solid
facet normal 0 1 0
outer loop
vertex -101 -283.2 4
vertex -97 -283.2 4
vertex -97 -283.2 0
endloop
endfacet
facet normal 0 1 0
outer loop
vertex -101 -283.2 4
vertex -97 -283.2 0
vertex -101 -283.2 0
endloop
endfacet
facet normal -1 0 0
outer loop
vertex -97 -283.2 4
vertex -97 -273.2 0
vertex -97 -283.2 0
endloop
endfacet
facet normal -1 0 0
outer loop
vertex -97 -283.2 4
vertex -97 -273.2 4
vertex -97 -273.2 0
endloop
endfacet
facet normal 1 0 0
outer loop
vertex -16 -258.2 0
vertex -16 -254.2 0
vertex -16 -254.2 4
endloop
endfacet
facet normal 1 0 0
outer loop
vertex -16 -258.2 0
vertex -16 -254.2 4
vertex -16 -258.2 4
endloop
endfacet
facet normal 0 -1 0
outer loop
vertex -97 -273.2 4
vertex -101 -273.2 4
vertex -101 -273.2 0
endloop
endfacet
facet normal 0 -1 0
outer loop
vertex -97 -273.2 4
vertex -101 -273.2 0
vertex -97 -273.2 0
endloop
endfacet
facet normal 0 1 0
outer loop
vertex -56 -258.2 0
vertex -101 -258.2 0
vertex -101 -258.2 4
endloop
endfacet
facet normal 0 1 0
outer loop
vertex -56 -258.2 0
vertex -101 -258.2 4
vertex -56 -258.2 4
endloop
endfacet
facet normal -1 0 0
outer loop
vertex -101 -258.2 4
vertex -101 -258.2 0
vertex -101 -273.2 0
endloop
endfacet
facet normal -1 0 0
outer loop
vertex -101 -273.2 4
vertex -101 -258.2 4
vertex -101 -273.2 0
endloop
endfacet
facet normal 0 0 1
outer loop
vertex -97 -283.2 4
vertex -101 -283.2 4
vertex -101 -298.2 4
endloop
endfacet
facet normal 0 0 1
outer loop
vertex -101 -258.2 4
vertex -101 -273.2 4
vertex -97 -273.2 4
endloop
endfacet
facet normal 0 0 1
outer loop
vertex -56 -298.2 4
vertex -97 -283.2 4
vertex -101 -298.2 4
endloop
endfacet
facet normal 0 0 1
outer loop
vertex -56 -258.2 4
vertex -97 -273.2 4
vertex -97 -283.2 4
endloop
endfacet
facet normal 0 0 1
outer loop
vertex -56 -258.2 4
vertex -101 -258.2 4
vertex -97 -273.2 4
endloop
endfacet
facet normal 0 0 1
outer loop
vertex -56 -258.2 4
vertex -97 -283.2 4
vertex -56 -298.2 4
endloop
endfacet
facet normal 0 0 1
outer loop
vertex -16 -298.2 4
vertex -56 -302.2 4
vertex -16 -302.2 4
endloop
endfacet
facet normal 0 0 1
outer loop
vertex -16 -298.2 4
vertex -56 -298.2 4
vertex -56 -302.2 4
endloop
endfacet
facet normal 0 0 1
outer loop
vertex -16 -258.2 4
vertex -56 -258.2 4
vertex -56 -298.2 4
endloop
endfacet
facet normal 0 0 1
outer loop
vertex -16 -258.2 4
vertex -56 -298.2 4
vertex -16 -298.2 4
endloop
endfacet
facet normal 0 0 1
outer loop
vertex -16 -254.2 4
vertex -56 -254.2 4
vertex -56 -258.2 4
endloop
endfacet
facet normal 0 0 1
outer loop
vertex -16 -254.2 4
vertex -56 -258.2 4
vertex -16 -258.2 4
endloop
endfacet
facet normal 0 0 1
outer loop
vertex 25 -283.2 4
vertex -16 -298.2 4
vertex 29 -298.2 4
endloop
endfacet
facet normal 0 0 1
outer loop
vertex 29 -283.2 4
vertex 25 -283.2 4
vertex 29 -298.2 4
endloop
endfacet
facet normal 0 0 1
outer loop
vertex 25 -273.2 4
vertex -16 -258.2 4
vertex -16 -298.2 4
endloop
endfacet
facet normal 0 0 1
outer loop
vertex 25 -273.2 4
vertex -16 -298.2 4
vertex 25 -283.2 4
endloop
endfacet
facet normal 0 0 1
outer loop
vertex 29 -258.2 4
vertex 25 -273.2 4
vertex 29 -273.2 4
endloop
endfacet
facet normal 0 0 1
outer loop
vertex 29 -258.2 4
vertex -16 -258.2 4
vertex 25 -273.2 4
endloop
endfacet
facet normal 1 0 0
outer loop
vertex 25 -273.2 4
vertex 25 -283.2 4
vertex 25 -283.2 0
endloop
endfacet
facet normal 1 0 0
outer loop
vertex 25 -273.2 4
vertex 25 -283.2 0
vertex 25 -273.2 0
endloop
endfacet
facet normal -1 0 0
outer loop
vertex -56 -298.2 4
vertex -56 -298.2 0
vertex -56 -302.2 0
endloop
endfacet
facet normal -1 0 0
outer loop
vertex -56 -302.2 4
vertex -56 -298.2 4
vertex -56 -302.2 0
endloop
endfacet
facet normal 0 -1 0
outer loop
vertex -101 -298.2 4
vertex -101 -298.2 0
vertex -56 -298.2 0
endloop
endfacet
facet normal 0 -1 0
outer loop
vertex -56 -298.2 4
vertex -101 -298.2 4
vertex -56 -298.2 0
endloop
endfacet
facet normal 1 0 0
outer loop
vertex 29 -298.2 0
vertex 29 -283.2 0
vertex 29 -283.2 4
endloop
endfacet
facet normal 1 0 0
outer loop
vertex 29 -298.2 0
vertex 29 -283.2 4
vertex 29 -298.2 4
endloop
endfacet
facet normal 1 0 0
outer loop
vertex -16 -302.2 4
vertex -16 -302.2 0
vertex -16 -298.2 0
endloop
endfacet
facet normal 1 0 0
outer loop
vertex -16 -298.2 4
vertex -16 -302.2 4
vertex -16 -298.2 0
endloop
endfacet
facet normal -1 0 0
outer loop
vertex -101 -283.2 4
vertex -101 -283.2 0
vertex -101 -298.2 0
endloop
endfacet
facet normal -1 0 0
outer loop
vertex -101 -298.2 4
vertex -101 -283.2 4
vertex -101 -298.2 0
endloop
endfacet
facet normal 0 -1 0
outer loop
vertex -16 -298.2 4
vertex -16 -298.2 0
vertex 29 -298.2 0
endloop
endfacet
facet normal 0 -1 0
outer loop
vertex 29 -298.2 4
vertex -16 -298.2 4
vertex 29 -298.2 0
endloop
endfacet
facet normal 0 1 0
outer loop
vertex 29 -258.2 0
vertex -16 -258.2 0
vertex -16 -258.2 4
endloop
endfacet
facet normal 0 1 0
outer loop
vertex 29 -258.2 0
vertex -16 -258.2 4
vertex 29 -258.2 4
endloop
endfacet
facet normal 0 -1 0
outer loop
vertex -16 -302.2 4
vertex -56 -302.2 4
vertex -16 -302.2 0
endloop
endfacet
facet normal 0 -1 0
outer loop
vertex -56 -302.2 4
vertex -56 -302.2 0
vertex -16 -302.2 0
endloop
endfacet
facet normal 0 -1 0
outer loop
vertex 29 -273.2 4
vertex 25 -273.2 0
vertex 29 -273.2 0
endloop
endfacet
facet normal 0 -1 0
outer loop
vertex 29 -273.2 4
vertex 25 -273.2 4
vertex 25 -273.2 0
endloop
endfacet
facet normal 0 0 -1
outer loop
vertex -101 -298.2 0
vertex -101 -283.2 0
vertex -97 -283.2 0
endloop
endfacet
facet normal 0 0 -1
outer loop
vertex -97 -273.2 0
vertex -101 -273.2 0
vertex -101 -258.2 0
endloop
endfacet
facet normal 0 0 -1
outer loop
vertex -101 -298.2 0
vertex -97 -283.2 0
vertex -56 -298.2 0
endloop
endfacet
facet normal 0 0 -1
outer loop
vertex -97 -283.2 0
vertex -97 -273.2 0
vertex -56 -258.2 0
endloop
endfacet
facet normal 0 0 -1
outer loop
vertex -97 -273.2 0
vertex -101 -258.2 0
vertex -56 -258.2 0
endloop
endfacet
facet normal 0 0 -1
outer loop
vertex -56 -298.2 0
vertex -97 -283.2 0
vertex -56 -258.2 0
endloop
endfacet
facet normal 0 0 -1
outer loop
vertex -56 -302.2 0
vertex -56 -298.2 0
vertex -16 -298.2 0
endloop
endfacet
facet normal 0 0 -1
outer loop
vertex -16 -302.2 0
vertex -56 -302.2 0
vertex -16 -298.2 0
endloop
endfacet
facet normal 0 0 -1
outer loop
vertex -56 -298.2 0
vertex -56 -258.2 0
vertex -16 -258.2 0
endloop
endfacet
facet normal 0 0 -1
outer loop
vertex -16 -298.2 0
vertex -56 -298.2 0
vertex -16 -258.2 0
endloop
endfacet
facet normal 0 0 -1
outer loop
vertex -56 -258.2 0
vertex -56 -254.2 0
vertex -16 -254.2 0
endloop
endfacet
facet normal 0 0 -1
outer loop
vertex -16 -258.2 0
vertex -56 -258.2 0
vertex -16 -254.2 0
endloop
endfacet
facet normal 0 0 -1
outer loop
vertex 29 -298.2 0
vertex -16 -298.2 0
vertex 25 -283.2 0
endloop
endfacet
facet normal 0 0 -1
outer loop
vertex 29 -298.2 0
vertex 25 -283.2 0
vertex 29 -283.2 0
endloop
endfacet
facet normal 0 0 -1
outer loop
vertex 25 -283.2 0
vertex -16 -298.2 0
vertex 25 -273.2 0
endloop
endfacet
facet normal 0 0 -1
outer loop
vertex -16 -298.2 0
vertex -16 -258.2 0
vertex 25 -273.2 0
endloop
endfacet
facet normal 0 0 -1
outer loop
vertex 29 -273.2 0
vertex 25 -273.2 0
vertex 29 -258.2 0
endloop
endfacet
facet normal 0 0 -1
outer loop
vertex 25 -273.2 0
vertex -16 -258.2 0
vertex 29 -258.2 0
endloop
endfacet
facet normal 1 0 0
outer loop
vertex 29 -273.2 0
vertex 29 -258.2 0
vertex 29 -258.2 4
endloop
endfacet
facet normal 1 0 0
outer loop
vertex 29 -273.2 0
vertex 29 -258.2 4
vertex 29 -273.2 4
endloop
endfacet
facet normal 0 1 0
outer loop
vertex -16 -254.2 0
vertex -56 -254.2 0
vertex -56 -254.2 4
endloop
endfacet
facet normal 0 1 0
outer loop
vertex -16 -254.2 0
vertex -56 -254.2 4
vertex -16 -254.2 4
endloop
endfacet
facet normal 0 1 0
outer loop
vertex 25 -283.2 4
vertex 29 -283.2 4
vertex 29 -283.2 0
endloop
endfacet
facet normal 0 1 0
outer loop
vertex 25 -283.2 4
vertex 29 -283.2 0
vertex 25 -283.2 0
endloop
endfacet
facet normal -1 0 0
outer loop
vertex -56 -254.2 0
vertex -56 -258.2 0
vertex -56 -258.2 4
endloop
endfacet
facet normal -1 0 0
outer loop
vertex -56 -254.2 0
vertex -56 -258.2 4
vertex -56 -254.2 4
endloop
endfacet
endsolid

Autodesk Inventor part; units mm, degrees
ref_plane "YZ Plane" through (0, 0, 0) normal (1, 0, 0) x (0, 1, 0)
ref_plane "XZ Plane" through (0, 0, 0) normal (0, 1, 0) x (-1, 0, 0)
sketch "Sketch1" plane through (0, 0, 0) normal (0, 0, 1) x (1, 0, 0)
  line L0 (-101, -254.2) -> (-101, -258.2)
  line L1 (-101, -258.2) -> (-56, -258.2)
  line L2 (-56, -258.2) -> (-56, -254.2)
  line L3 (-56, -254.2) -> (-16, -254.2)
  line L4 (-16, -254.2) -> (-16, -258.2)
  line L5 (-16, -258.2) -> (29, -258.2)
  line L6 (29, -258.2) -> (29, -254.2)
  line L7 (-101, -258.2) -> (-101, -298.2)
  line L8 (29, -258.2) -> (29, -298.2)
  line L9 (29, -278.2) -> (70.7342, -278.2)
  line L10 (-56, -298.2) -> (-56, -302.2)
  line L11 (-56, -302.2) -> (-16, -302.2)
  line L12 (-16, -302.2) -> (-16, -298.2)
  line L13 (-101, -298.2) -> (-56, -298.2)
  line L14 (-16, -298.2) -> (29, -298.2)
  point P0 (0, 0)
  dimension "d0" = 40
  dimension "d1" = 40
  dimension "d2" = 130
extrude "Extrusion1" add sketch "Sketch1" along normal blind 4
sketch "Sketch2" plane through (0, 0, 4) normal (0, 0, 1) x (1, 0, 0)
  line L0 (-56, -258.2) -> (-101, -258.2) projected
  line L1 (-101, -258.2) -> (-101, -298.2) projected
  line L2 (-101, -298.2) -> (-56, -298.2) projected
  line L3 (-56, -298.2) -> (-56, -302.2) projected
  line L4 (-56, -302.2) -> (-16, -302.2) projected
  line L5 (-16, -302.2) -> (-16, -298.2) projected
  line L6 (-16, -298.2) -> (29, -298.2) projected
  line L7 (29, -298.2) -> (29, -258.2) projected
  line L8 (29, -258.2) -> (-16, -258.2) projected
  line L9 (-16, -258.2) -> (-16, -254.2) projected
  line L10 (-16, -254.2) -> (-56, -254.2) projected
  line L11 (-56, -254.2) -> (-56, -258.2) projected
  line L12 (25, -273.2) -> (29, -273.2)
  line L13 (29, -273.2) -> (29, -283.2)
  line L14 (29, -283.2) -> (25, -283.2)
  line L15 (25, -283.2) -> (25, -273.2)
  point P0 (0, 0)
  point P1 (29, -278.2)
  dimension "d5" = 4
  dimension "d6" = 10
extrude "Extrusion2" cut sketch "Sketch2" against normal blind 4 contours L7 L14 L15 L12
ref_plane "Work Plane1" through (-36, -258.2, 4) normal (1, 0, 0) x (0, 0, -1)
mirror "Mirror1" about plane through (-36, -258.2, 4) normal (1, 0, 0) of "Extrusion2"
properties part number "F4"
